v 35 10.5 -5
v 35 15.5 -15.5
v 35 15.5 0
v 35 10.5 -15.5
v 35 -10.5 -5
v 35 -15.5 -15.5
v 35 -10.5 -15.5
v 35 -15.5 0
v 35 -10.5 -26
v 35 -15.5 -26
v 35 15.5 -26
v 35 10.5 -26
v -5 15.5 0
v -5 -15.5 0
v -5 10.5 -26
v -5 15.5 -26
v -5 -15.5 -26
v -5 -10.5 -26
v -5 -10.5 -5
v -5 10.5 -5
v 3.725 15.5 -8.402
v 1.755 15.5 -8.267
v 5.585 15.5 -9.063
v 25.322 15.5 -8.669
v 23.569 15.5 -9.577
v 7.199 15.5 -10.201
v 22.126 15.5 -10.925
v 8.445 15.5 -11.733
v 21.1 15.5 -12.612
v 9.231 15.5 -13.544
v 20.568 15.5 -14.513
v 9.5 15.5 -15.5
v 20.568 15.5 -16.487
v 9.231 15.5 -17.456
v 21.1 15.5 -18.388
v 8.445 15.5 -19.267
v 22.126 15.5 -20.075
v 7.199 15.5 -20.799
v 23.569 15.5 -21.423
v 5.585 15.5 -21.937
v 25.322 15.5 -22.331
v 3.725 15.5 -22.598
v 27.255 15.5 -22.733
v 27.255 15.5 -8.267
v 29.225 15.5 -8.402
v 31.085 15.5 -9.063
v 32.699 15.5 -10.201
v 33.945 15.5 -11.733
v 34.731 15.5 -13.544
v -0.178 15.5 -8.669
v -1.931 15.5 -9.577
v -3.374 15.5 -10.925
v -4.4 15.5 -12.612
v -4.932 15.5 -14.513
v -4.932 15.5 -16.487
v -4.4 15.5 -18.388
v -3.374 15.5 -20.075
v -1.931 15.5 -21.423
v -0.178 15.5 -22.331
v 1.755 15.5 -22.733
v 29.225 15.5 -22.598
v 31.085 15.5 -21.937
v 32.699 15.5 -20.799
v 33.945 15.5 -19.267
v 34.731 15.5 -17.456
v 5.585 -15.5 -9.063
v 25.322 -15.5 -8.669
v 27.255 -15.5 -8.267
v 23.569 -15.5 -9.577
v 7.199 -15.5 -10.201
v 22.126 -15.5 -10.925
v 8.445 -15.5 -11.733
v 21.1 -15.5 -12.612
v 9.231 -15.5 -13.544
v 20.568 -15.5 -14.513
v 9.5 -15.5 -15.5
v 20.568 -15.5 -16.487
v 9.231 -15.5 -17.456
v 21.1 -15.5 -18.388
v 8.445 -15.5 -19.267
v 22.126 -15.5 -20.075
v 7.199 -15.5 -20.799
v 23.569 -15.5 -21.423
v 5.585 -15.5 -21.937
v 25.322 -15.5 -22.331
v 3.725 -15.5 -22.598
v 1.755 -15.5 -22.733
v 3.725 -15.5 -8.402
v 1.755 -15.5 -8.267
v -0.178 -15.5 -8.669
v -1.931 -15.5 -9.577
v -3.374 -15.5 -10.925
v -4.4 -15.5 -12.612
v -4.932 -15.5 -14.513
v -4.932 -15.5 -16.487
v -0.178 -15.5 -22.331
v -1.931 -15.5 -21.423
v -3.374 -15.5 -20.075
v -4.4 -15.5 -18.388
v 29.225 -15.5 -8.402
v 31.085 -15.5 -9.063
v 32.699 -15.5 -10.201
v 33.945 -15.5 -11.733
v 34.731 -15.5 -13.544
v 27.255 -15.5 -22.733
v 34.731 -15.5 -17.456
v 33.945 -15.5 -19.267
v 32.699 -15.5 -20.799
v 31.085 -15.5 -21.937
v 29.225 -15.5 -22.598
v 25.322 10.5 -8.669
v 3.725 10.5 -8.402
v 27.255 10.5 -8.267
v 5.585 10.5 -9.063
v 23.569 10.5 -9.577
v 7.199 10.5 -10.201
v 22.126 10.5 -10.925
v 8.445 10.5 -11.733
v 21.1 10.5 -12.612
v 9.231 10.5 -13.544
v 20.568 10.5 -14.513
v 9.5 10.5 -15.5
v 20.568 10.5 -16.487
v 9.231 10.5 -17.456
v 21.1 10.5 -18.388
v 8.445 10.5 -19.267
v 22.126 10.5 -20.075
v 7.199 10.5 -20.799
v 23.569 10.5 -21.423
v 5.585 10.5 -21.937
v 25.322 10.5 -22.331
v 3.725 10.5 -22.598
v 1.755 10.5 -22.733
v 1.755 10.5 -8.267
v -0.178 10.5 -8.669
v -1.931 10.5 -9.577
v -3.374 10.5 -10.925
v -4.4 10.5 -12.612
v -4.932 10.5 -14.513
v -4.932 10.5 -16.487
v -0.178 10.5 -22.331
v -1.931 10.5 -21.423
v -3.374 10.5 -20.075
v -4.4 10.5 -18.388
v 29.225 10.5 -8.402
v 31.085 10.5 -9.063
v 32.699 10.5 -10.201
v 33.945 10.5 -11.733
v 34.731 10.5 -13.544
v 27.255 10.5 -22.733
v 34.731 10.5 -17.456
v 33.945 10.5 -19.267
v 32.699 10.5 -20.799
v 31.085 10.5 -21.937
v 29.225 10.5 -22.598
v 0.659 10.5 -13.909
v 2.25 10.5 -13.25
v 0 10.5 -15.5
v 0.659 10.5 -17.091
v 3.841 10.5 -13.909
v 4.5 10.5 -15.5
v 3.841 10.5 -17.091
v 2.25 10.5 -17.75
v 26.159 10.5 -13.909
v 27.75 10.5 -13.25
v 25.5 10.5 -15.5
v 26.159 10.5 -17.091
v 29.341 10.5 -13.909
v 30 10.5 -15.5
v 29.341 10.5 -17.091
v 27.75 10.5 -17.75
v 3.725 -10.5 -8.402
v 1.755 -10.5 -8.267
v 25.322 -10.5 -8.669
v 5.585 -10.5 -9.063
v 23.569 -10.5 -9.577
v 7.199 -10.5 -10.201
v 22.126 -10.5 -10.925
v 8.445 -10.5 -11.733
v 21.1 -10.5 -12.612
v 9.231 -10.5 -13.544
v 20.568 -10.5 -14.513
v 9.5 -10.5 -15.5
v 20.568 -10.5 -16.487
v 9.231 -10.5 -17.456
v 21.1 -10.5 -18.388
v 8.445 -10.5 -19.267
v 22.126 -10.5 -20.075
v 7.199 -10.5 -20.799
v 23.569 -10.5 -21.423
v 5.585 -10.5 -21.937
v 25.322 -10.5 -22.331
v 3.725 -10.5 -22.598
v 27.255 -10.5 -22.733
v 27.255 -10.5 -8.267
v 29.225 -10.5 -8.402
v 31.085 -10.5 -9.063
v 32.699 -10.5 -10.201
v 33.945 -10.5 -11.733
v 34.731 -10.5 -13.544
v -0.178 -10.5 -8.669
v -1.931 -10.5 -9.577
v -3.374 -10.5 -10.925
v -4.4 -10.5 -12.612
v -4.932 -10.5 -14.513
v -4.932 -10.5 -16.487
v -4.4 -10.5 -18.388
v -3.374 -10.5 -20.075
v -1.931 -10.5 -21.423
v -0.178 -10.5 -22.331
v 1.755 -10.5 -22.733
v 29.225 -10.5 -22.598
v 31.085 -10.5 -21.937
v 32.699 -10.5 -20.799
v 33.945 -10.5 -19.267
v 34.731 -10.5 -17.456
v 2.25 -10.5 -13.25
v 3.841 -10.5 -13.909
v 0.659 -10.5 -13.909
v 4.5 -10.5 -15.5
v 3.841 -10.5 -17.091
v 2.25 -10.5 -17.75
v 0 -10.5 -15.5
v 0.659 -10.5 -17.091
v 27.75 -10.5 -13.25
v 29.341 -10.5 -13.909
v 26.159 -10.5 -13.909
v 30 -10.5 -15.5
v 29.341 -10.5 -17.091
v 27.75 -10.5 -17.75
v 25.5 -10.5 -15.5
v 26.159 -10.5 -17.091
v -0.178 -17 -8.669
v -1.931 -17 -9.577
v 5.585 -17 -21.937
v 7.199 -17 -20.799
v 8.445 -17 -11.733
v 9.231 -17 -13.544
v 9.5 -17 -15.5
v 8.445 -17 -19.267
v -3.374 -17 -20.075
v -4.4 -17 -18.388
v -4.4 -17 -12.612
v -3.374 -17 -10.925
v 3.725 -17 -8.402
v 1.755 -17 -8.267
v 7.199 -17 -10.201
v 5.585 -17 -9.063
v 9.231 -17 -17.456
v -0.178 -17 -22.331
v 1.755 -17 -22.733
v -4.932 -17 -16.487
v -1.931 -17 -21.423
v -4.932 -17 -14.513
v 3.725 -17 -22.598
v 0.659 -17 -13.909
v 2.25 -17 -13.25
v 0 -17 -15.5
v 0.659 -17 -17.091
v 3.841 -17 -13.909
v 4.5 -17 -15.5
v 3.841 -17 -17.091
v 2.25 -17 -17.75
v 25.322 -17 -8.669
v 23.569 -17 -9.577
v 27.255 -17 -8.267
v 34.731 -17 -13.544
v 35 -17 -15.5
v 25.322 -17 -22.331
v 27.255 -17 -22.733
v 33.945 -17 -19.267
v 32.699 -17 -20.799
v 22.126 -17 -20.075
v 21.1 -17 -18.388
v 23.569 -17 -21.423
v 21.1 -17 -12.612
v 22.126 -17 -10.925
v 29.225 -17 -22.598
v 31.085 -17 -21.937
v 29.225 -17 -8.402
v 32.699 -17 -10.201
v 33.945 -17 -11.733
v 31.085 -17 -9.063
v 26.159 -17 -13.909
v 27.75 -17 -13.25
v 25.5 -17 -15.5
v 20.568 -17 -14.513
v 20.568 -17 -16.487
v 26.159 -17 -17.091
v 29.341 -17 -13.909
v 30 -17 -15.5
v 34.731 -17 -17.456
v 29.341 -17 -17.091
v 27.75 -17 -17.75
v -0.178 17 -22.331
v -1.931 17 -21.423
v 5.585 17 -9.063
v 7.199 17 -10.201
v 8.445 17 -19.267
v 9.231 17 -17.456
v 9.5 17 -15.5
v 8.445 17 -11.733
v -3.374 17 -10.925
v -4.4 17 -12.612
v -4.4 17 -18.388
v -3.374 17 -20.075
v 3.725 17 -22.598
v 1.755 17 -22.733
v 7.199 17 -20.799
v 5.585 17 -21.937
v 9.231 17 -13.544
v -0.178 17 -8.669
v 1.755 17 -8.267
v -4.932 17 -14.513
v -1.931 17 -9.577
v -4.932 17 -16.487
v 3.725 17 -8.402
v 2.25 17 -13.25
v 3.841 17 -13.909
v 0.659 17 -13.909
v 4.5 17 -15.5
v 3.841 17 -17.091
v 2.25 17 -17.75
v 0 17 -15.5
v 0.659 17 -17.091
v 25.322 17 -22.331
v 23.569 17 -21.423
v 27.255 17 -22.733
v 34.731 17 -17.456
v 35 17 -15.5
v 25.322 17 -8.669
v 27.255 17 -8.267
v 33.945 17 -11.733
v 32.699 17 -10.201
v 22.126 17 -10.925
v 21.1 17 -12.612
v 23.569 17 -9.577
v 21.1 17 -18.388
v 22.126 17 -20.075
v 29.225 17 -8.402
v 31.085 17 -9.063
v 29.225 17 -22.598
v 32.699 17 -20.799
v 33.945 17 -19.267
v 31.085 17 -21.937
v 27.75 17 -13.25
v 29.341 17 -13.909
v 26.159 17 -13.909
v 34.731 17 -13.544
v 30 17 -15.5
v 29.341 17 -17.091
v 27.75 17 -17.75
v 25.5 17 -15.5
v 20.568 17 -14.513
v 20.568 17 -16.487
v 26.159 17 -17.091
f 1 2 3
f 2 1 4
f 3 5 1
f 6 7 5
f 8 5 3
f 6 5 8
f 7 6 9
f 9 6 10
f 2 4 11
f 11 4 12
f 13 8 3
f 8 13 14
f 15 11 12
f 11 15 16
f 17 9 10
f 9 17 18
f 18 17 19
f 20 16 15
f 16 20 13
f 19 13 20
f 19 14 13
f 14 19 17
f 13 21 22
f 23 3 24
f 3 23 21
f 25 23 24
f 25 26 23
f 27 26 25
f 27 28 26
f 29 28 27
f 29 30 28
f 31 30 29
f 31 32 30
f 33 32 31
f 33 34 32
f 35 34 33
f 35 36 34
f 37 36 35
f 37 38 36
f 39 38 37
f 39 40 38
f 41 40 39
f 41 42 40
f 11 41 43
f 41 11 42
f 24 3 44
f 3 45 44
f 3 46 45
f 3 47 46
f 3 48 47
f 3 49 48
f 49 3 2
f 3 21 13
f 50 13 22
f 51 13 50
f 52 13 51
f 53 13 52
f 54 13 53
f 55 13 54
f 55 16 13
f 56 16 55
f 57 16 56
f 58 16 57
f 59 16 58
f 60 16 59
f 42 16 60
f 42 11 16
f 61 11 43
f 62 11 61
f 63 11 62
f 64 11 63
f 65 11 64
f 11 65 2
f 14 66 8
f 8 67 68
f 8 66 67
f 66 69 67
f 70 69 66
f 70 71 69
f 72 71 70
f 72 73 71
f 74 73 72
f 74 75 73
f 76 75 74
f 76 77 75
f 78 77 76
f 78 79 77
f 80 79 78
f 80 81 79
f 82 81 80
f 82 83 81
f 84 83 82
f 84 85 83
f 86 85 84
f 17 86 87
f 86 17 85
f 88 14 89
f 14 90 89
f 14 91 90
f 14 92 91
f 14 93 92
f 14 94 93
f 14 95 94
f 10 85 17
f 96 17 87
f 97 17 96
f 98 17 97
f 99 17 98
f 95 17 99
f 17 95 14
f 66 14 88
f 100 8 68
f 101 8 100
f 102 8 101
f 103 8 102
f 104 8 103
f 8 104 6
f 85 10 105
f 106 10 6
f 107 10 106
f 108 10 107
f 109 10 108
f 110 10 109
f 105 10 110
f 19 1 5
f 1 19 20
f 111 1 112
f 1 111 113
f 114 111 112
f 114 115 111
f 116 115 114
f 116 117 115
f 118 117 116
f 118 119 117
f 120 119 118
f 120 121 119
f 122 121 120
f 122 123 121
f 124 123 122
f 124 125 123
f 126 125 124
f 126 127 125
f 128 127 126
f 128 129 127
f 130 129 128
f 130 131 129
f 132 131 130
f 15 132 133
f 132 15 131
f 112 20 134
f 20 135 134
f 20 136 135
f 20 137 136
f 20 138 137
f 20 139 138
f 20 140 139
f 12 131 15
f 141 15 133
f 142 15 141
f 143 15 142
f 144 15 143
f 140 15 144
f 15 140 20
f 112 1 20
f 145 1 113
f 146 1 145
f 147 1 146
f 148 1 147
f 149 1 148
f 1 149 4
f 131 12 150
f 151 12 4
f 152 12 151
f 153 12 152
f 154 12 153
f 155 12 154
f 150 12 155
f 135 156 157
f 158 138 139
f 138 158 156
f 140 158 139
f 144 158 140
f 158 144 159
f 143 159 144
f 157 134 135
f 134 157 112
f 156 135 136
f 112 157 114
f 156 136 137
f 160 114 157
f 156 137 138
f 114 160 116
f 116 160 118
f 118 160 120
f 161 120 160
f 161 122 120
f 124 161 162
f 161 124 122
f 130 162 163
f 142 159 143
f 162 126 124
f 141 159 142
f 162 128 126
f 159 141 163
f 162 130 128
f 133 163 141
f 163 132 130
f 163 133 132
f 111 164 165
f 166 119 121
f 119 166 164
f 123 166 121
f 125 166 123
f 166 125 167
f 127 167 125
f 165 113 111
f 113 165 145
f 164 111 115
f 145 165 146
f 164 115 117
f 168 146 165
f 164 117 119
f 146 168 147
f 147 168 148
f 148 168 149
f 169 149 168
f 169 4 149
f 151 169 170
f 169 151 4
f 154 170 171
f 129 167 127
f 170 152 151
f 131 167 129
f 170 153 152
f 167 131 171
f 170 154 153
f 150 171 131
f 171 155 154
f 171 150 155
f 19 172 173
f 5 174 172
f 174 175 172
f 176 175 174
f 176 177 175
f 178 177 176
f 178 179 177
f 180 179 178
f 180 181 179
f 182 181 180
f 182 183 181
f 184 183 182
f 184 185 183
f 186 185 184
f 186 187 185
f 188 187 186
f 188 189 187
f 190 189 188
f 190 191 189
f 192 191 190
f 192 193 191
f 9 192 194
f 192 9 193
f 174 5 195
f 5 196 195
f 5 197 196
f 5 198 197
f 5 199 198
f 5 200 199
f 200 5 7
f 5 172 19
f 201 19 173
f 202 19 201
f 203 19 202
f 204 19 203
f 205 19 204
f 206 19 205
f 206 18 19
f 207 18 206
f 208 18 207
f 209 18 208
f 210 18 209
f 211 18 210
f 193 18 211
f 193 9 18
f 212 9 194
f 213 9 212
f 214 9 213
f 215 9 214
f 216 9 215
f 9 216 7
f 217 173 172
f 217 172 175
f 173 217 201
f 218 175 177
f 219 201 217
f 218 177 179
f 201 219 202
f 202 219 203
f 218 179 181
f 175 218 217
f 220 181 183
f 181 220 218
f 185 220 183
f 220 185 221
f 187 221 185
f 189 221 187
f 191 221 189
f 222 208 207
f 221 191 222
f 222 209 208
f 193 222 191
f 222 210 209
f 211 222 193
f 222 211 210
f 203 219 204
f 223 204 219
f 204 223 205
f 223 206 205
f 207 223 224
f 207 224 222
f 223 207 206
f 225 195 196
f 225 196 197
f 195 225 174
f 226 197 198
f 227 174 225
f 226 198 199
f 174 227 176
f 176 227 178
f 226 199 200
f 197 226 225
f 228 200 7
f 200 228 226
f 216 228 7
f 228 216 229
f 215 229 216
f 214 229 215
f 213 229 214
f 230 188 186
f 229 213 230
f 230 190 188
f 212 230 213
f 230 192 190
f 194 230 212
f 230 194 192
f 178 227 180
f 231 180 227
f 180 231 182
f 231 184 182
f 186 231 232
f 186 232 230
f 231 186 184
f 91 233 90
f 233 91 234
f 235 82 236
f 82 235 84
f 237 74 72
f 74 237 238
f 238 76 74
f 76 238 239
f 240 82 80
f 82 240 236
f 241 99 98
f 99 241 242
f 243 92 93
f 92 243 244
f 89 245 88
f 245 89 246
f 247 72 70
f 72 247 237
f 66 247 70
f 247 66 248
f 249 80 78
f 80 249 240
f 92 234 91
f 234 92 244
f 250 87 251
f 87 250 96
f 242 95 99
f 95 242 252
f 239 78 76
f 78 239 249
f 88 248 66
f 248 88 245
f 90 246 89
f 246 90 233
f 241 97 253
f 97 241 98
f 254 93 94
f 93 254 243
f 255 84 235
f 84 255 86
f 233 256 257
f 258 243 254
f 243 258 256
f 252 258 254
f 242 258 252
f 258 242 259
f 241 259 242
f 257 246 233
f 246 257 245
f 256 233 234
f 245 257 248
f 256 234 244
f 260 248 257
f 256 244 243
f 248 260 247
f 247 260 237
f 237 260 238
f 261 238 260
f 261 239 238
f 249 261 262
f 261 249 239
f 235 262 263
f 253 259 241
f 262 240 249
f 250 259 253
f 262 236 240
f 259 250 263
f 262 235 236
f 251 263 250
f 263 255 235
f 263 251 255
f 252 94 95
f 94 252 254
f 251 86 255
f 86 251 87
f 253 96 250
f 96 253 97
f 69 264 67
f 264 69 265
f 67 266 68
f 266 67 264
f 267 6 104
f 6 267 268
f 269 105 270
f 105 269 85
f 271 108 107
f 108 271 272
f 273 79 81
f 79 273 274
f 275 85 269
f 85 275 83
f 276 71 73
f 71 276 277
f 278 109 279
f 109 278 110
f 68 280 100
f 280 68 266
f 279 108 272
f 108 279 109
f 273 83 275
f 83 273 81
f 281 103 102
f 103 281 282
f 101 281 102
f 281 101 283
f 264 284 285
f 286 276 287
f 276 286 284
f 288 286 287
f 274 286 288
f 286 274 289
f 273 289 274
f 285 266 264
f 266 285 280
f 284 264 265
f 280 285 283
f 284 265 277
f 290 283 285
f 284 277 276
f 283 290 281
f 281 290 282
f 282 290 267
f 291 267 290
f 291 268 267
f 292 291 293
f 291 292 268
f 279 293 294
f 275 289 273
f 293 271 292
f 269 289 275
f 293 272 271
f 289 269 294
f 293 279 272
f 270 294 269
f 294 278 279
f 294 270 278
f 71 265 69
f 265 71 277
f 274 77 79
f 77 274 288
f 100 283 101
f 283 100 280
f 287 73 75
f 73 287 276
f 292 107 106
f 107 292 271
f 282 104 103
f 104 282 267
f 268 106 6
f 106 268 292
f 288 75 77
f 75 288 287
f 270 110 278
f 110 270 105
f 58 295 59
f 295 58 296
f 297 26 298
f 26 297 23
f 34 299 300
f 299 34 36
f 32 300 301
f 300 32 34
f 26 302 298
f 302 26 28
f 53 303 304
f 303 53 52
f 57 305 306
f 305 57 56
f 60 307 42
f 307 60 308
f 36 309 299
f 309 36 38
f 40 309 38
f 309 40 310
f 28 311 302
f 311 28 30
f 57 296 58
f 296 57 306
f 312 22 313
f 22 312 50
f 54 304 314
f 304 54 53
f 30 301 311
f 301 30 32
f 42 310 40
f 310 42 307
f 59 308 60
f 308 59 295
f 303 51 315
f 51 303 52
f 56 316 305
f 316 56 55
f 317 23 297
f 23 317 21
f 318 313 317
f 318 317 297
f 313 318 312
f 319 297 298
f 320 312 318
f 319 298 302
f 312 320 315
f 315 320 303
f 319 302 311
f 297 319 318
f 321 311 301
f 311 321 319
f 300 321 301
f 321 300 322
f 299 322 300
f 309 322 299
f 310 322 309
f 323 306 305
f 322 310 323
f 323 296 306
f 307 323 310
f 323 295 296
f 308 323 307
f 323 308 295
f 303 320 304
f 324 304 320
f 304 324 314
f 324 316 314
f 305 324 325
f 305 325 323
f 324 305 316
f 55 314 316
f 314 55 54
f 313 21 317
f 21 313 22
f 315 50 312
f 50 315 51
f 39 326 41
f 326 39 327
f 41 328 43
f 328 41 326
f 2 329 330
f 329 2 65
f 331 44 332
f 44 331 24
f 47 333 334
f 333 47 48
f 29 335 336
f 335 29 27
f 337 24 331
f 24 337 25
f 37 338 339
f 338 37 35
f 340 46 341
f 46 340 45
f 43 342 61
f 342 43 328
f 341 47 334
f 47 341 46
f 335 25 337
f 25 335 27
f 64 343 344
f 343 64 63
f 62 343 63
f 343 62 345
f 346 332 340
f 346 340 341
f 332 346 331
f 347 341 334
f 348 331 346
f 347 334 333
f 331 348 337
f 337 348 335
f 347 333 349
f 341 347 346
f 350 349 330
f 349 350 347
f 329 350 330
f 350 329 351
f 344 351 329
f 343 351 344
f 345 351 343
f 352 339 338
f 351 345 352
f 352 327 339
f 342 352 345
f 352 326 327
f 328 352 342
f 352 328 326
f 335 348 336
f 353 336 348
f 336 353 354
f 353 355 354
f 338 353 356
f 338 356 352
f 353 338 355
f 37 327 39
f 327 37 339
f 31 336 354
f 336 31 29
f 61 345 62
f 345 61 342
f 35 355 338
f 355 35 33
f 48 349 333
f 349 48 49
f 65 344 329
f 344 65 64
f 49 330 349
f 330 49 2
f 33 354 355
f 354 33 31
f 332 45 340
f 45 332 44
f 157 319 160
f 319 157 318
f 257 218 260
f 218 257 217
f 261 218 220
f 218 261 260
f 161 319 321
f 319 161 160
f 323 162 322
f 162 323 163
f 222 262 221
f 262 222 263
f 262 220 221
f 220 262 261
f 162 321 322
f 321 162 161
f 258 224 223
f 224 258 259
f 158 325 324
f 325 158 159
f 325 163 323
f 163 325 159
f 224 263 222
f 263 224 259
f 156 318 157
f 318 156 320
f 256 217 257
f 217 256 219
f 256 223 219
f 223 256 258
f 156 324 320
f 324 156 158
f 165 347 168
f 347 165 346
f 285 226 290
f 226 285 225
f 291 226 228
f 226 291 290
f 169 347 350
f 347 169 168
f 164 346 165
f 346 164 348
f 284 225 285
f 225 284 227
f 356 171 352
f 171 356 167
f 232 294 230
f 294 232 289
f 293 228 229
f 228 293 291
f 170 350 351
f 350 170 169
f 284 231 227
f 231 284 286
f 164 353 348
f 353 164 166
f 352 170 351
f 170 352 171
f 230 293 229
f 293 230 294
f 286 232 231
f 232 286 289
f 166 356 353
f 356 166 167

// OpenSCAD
lonNEMA=42.3;

module monturaExtrusor(){
    tol=1;
    diamTorBal=4.6;
    distBalerosX=40;
    //lonNEMA=42.3;
    distEntreTorY=lonNEMA+24+(tol*2);
    diamTorProf=5.8;
    minkow=7;
    alturaPoste=8.3;
    espesor=5;//espesor 6
    calcePerfil=3.67;
    diamTuerca=10.58;
    altTuerca=3.5;

    esp=3.75;
    altPil=16;
    disXP=24.75;
    offNema=35;
    
    tolM4=0.5;//antes 0.25
    minkBase=10;
    alturaNema=40+1.3;
            
    perfil=20;
     canal=6;
     ajEsX=4;
     diamT=7;

     angulo=90;
     ajNema=5;
     ajNemaY=6;
     
      lon20=20;
  
     rec45=sqrt(pow(lonNEMA/2,2)+pow(lonNEMA/2,2));


    //23 mm referido a la altura del motor nema hacia el perfil
     
    //apoyo tornillos a perfil
    //translate([-lon20/2,0,-lon20/2])
    //rotate([0,-90,0])
    difference(){
     
        diamPostes=4+tolM4+(espesor*2);
        
         lonY_c=lon20+(espesor*2)+tol;
         lonX_c=lon20*2;
         lonZ_c=lon20+tol+espesor;
               union(){
                  
              //cuerpo abrazadera               
              translate([(lonX_c/2)-espesor,0,-lonZ_c/2])
                difference(){ 
                     cube([lonX_c,lonY_c,lonZ_c],center=true);
                  
                    translate([0,0,-espesor/2])
                   cube([lonX_c*2,lonY_c-(espesor*2),lonZ_c-espesor],center=true);
                }
                
                  //postes tronillos M4 con 2mm extra              
                 for(g=[0:1]){
                    translate([0,0,g*2*(-(tol/2)-espesor-(lon20/2))])
                   rotate([180*g,0,0])
                   translate([-espesor+(diamPostes/2),-(lon20/2)-(tol/2),(-(tol/2)-espesor-(lon20/2))])
                   
                    for(u=[0:1]){
                      translate([(lonX_c-diamPostes)*u,0,0])
                        rotate([90,0,0])
                      cylinder(d=diamPostes,h=espesor+1.5); 
                    }//for u
                  }//for g
                  
                  
                }
                 //taladros postes tronillos m4
                 translate([-espesor+(diamPostes/2),0,(-(tol/2)-espesor-(lon20/2))])
                for(u=[0:1]){
                  translate([(lonX_c-diamPostes)*u,0,0])
                  rotate([90,0,0])
                  cylinder(d=4+tolM4,h=1000,center=        true); 
                }
                
            }
          
 }//fin modulo


monturaExtrusor();
